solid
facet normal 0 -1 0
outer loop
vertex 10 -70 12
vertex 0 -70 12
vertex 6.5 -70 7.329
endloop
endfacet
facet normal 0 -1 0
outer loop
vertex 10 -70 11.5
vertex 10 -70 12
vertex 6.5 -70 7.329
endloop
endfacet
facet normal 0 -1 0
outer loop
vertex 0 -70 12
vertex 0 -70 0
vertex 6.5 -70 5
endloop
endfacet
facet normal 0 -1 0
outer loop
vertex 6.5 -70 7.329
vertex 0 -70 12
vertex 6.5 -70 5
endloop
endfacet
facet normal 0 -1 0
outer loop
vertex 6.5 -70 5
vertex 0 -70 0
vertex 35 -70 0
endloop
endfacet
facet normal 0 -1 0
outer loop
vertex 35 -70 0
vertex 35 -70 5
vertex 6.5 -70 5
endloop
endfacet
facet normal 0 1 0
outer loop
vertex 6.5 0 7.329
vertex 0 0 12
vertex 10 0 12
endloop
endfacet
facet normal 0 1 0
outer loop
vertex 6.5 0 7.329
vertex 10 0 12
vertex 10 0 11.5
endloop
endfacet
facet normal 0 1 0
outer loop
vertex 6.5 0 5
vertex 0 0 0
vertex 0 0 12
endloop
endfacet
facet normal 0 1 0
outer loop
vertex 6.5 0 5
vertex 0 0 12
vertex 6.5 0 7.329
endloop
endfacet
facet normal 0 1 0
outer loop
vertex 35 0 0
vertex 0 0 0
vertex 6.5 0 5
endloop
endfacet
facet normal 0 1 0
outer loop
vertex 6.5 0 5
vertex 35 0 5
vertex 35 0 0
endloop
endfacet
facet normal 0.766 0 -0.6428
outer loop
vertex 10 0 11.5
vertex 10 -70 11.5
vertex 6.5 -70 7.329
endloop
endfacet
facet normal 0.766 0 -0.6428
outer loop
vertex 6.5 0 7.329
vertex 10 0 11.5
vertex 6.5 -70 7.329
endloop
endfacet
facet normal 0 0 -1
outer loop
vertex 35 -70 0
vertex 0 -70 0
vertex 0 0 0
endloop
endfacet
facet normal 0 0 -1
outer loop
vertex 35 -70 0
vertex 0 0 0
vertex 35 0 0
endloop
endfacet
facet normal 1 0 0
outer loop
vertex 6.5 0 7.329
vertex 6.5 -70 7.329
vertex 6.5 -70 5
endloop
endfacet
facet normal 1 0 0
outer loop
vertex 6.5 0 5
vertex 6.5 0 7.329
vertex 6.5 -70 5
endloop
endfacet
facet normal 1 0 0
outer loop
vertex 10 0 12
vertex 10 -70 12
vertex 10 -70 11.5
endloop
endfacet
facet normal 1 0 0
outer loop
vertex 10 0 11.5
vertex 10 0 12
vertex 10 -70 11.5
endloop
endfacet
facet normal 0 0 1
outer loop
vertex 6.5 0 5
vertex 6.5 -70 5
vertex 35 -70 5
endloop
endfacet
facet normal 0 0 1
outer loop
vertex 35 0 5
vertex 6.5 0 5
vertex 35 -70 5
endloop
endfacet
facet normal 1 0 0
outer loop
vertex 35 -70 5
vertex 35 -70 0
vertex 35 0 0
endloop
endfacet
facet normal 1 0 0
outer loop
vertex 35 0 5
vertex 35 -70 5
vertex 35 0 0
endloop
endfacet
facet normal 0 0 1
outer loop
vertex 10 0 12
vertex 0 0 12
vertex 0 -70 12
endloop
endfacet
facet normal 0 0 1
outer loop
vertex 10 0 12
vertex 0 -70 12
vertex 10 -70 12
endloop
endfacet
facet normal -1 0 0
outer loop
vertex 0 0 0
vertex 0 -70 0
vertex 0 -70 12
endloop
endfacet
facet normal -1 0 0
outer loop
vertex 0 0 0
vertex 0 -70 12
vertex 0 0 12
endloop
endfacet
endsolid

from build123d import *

# Parameters (mm, degrees)
SKETCH_1_W          = 35
SKETCH_1_H          = 70
EXTRUDE_1_DEPTH     = 12
CUT_EXTRUDE_1_REACH = 81.177


with BuildPart() as part:
    # 草图1 → 凸台-拉伸1 (new body)
    with BuildSketch(Plane.XY):
        with Locations((17.5, -35)):
            Rectangle(SKETCH_1_W, SKETCH_1_H)
    extrude(amount=EXTRUDE_1_DEPTH)

    # 草图2 → 切除-拉伸1 (cut, up to next)
    with BuildSketch(Plane.XZ.offset(70), mode=Mode.PRIVATE) as cut_extrude_1_sk1:
        Polygon((10, 12), (10, 11.5), (6.5, 7.328862426), (6.5, 5), (35, 5), (35, 12), align=None)
    cut_extrude_1_tool1 = extrude(cut_extrude_1_sk1.sketch, amount=-CUT_EXTRUDE_1_REACH, mode=Mode.PRIVATE) & part.part
    add(cut_extrude_1_tool1.solids().sort_by_distance((21.366311, -70, 8.408444))[0], mode=Mode.SUBTRACT)


solid = part.part
